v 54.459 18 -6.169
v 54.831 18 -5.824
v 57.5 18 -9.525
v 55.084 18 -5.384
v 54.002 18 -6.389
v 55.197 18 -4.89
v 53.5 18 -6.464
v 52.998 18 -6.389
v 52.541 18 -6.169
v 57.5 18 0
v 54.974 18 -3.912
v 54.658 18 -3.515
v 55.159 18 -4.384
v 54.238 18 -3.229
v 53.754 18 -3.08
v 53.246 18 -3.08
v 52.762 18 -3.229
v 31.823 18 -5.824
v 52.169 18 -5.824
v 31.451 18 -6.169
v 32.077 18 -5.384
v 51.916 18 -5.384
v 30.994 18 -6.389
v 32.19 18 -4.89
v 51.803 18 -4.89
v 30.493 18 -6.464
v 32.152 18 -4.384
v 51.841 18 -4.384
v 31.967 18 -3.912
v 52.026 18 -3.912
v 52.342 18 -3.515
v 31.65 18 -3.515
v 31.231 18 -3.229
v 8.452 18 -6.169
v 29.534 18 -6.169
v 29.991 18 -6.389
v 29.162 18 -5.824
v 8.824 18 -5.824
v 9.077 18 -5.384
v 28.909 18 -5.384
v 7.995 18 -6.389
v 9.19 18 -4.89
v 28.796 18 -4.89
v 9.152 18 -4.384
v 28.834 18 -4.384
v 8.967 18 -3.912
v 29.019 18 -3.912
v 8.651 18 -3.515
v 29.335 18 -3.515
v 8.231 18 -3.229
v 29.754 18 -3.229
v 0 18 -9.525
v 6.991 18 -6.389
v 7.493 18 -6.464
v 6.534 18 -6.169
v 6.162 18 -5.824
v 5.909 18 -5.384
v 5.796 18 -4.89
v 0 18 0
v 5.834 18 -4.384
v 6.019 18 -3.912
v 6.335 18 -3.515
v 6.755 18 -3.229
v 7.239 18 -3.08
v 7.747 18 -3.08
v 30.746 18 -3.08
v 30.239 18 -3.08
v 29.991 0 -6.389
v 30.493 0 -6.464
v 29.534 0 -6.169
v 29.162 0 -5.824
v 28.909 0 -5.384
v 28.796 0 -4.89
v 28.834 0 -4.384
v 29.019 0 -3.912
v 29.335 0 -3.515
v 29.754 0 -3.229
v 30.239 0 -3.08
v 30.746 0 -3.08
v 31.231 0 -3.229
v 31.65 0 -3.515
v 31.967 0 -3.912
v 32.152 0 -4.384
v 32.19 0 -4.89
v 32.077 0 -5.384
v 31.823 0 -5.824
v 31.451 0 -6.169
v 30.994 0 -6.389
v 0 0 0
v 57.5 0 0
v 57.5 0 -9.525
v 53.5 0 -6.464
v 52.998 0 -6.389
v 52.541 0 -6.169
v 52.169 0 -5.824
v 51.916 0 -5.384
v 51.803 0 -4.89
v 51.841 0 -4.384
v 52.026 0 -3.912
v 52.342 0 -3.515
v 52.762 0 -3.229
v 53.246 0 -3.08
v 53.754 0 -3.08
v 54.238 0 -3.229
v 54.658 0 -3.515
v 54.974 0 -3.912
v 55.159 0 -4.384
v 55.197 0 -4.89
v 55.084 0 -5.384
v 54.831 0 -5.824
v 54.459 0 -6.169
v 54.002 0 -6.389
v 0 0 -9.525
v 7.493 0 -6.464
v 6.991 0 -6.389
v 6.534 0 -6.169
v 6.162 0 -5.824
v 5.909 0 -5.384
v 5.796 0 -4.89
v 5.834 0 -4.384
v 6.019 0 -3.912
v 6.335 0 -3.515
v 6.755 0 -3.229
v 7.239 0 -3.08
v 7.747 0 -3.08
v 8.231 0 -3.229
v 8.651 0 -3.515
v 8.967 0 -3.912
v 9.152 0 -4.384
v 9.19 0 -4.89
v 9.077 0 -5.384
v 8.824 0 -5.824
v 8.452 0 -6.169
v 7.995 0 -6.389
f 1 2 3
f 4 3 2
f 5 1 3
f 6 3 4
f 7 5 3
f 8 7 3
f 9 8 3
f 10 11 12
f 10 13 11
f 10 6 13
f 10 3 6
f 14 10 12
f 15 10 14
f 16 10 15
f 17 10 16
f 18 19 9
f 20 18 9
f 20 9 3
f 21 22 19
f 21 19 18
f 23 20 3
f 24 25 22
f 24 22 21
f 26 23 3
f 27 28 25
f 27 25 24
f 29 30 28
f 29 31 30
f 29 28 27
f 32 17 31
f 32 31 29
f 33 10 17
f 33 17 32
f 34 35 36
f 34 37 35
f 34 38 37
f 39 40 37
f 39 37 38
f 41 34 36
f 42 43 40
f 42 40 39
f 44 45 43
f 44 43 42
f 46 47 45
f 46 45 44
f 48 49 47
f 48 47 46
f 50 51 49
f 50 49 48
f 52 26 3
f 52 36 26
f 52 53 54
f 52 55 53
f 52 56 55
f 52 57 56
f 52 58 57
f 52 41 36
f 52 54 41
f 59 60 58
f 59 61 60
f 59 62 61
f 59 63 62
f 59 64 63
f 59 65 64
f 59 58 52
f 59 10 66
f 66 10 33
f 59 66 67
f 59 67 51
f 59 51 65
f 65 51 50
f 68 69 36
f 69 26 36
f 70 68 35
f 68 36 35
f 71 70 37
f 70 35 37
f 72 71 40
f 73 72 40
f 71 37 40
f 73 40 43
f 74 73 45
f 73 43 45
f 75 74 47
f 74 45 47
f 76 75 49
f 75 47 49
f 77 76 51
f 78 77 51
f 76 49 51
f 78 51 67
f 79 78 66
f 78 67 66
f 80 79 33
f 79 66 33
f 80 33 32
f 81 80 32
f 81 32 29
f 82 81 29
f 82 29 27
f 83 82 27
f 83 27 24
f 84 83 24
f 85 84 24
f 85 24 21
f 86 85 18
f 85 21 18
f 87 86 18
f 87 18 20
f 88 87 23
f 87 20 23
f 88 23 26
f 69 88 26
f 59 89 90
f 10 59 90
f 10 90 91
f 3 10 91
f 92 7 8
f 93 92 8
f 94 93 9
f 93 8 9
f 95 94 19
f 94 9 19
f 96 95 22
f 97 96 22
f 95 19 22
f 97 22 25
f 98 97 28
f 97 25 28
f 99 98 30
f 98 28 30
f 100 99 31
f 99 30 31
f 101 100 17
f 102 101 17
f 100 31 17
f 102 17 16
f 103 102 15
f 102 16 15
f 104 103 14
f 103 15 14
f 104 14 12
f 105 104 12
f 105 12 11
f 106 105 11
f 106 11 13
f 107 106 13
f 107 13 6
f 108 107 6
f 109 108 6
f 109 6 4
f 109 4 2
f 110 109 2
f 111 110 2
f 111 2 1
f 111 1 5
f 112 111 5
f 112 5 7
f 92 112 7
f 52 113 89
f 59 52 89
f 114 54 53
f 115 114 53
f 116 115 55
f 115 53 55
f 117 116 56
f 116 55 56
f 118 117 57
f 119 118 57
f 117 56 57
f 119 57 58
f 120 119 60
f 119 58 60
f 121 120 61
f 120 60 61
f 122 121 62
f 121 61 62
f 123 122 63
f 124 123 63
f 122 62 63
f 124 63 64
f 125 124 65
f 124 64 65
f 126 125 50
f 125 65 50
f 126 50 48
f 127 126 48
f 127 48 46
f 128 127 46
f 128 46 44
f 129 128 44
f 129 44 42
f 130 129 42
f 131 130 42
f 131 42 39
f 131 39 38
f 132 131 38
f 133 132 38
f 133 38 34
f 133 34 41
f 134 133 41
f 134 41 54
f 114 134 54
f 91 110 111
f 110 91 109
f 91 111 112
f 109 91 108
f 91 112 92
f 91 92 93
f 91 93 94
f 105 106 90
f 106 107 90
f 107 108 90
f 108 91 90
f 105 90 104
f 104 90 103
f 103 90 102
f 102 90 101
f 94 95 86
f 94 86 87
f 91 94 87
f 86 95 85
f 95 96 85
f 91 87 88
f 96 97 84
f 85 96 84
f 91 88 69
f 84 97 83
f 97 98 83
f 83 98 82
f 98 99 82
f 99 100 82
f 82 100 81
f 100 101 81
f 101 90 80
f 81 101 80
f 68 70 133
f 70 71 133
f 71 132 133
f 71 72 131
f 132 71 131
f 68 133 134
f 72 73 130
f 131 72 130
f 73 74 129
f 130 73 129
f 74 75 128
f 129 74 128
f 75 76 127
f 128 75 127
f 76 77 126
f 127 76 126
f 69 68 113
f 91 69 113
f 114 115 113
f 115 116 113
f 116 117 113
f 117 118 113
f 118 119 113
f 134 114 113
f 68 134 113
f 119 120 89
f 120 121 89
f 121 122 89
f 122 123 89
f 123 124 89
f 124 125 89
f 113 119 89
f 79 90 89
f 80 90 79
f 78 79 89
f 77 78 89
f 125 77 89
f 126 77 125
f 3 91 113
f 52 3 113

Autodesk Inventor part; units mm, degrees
ref_plane "YZ Plane" through (0, 0, 0) normal (1, 0, 0) x (0, 1, 0)
ref_plane "XZ Plane" through (0, 0, 0) normal (0, 1, 0) x (-1, 0, 0)
ref_plane "XY Plane" through (0, 0, 0) normal (0, 0, 1) x (1, 0, 0)
sketch "Sketch1" plane through (0, 0, 0) normal (0, 1, 0) x (-1, 0, 0)
  line L0 (0, 0) -> (-57.5, 0)
  line L1 (-57.5, 0) -> (-57.5, -9.525)
  line L2 (-57.5, -9.525) -> (0, -9.525)
  line L3 (0, -9.525) -> (0, 0)
  line L4 (0, -4.7625) -> (-57.5, -4.7625) construction
  circle A0 centre (-7.493, -4.7625) radius 1.5
  circle A1 centre (-53.5, -4.7625) radius 1.5
  circle A2 centre (-30.4927, -4.7625) radius 1.5
  dimension "d0" = 9.525
  dimension "d1" = 57.5
  dimension "d2" = 3
  dimension "d3" = 7.493
  dimension "d4" = 4
  dimension "d14" = 22.9997
  dimension "d15" = 23.0073
extrude "Extrusion1" add sketch "Sketch1" along normal blind 18 contours L3 L2 L1 L0 | A0 | A1 | A2
hole "Hole1" at (53.5, 0, -4.7625) at (7.493, 0, -4.7625) at (30.4927, 0, -4.7625) direction (0, 1, 0) diameter 3.4036 end through all clearance for "Flat Head Machine Screw" size "M3" standard "Ansi Metric M Profile"
properties part number "Drive Frame Spacing Block" material "Aluminum 6061"
